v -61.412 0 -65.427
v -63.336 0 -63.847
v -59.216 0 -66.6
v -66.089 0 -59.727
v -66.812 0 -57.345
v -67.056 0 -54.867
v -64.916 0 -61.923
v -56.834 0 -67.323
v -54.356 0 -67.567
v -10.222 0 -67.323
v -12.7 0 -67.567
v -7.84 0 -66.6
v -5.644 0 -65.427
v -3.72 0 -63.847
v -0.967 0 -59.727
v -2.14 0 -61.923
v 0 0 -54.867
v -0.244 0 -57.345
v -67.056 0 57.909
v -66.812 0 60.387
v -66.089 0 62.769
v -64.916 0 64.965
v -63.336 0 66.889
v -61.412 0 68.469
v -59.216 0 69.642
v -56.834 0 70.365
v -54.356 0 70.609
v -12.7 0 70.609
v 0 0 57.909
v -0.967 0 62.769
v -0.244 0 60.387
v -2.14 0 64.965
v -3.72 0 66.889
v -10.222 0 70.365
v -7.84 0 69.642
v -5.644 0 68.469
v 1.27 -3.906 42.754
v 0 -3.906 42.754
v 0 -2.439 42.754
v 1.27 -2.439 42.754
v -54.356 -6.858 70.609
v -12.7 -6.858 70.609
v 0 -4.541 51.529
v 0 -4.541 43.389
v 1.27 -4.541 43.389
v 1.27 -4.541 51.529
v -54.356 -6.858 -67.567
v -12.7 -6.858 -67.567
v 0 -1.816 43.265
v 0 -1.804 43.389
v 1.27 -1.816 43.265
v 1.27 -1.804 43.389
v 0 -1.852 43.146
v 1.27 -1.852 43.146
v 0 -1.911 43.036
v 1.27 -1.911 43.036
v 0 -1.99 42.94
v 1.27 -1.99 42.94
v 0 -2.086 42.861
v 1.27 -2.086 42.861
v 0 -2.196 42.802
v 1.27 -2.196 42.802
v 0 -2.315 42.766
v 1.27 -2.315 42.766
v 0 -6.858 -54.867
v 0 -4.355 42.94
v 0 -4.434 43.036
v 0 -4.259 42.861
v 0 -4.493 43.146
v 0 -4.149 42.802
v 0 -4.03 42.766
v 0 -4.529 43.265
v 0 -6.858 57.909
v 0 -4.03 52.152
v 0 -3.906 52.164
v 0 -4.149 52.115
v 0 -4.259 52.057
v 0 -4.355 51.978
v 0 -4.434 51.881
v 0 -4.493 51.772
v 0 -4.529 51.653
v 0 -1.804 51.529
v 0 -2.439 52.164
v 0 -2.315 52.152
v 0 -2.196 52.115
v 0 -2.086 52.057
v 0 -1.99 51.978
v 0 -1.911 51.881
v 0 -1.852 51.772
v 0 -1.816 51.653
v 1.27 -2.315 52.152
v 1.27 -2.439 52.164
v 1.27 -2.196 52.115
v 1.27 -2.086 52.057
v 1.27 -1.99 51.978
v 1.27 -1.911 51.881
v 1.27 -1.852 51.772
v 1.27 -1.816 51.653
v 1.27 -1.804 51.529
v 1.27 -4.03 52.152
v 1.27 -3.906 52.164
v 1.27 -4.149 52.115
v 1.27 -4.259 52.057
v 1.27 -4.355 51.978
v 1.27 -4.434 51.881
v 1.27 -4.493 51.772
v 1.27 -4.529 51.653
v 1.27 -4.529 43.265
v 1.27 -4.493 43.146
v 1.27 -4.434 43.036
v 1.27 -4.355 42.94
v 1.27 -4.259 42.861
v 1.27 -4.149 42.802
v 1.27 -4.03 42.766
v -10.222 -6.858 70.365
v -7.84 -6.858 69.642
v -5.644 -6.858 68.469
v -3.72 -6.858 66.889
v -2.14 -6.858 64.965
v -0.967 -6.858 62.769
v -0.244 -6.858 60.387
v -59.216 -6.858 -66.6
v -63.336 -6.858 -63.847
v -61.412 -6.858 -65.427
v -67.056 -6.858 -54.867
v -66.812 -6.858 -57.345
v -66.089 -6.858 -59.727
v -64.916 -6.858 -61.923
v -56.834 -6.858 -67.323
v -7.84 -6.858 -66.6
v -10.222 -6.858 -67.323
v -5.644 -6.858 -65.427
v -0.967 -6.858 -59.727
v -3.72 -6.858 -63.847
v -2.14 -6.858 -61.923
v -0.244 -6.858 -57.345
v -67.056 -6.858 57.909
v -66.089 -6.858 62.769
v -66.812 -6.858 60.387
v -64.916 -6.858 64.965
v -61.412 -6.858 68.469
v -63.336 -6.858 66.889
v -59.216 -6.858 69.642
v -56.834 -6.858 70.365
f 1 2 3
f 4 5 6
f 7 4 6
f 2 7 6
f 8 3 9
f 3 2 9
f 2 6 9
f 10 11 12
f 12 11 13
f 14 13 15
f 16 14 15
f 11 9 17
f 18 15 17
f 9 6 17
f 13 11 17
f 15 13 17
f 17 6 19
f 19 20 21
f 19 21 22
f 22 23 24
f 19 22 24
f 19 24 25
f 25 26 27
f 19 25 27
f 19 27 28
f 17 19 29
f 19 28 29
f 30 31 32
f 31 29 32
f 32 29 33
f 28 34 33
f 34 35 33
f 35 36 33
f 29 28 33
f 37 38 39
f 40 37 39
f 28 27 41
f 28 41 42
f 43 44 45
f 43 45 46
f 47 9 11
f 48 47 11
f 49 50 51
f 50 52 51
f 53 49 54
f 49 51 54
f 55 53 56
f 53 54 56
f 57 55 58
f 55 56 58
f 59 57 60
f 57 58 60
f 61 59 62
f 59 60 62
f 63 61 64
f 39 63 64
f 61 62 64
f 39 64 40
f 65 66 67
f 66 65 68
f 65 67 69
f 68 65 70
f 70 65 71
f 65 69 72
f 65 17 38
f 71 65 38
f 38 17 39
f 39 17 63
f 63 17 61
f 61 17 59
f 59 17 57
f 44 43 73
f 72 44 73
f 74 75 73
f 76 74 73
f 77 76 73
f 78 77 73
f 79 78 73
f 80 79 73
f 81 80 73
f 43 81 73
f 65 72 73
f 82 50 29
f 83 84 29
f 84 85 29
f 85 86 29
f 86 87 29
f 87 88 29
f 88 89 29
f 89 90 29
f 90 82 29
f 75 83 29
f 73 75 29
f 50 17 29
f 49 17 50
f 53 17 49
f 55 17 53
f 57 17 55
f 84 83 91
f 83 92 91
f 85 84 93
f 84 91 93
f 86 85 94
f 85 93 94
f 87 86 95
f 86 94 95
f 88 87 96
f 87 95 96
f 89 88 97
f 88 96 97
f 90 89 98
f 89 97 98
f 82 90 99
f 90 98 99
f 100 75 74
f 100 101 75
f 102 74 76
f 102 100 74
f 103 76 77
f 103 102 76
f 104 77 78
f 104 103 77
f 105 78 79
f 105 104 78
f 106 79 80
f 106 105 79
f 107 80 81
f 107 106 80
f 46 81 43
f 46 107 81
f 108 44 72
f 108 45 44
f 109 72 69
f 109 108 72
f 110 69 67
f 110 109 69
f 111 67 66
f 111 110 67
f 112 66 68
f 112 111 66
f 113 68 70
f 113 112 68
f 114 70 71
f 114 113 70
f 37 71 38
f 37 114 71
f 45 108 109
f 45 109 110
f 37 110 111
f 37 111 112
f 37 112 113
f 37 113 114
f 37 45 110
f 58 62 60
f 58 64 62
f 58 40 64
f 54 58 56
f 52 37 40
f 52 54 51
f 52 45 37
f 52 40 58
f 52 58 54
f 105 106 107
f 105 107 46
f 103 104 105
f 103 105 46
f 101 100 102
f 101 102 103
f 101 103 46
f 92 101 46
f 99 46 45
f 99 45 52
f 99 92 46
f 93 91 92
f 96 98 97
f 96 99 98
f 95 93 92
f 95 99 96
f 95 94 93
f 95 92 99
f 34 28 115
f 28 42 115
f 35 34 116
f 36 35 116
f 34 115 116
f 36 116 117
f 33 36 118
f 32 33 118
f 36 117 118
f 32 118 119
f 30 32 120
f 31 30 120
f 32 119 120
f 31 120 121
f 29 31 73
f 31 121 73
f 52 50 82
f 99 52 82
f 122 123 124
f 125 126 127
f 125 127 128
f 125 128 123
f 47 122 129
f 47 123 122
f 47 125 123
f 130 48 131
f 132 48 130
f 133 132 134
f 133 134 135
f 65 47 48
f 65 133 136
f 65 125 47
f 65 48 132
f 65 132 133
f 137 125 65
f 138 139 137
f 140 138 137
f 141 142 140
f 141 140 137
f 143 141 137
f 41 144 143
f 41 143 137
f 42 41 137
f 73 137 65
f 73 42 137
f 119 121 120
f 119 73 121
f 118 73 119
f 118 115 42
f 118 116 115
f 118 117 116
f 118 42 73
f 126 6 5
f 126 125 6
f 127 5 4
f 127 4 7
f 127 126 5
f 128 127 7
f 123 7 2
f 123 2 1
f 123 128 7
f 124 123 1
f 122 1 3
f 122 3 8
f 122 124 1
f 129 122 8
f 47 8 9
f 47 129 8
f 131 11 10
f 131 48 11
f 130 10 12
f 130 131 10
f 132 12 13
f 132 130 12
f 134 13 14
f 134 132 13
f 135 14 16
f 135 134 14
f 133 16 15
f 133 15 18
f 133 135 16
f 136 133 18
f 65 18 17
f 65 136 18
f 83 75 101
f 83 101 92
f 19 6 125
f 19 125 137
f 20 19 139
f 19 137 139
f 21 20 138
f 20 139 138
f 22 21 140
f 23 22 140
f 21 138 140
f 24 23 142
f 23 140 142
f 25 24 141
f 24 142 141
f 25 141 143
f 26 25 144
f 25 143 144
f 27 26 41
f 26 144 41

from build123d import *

# Parameters (mm, degrees)
F0_W     = 67.056
F0_H     = 138.176
F1_DEPTH = 6.858
F2_R     = 12.7
F3_R     = 12.7
F4_R     = 12.7
F5_R     = 12.7
F8_W     = 2.7374484343
F8_H     = 9.4099827111
F9_DEPTH = 1.27
F10_R    = 0.635
F11_R    = 0.635
F12_R    = 0.635
F13_R    = 0.635


# Not quite as in the source:
# - the program builds the solid bodies; features that only make, move or delete a surface that nothing else refers to are left out


with BuildPart() as f1:
    # F0 (on Front) → F1 (new body)
    with BuildSketch(Plane.XZ):
        with Locations((-33.528, 1.5209056576)):
            Rectangle(F0_W, F0_H)
    extrude(amount=F1_DEPTH)

    # F2
    f2_edges = [f1.edges().sort_by_distance(p)[0] for p in [
        (-67.056, -3.429, 70.608906),
    ]]
    fillet(f2_edges, radius=F2_R)

    # F3
    f3_edges = [f1.edges().sort_by_distance(p)[0] for p in [
        (0, -3.429, 70.608906),
    ]]
    fillet(f3_edges, radius=F3_R)

    # F4
    f4_edges = [f1.edges().sort_by_distance(p)[0] for p in [
        (-67.056, -3.429, -67.567094),
    ]]
    fillet(f4_edges, radius=F4_R)

    # F5
    f5_edges = [f1.edges().sort_by_distance(p)[0] for p in [
        (0, -3.429, -67.567094),
    ]]
    fillet(f5_edges, radius=F5_R)

    # F8 (on face) → F9 (join)
    with BuildSketch(Plane.YZ):
        with Locations((-3.1723636785, 47.4587213248)):
            Rectangle(F8_W, F8_H)
    extrude(amount=F9_DEPTH)

    # F10
    f10_edges = [f1.edges().sort_by_distance(p)[0] for p in [
        (0.635, -1.803639, 52.163713),
    ]]
    fillet(f10_edges, radius=F10_R)

    # F11
    f11_edges = [f1.edges().sort_by_distance(p)[0] for p in [
        (0.635, -1.803639, 42.75373),
    ]]
    fillet(f11_edges, radius=F11_R)

    # F12
    f12_edges = [f1.edges().sort_by_distance(p)[0] for p in [
        (0.635, -4.541088, 52.163713),
    ]]
    fillet(f12_edges, radius=F12_R)

    # F13
    f13_edges = [f1.edges().sort_by_distance(p)[0] for p in [
        (0.635, -4.541088, 42.75373),
    ]]
    fillet(f13_edges, radius=F13_R)


solid = f1.part
